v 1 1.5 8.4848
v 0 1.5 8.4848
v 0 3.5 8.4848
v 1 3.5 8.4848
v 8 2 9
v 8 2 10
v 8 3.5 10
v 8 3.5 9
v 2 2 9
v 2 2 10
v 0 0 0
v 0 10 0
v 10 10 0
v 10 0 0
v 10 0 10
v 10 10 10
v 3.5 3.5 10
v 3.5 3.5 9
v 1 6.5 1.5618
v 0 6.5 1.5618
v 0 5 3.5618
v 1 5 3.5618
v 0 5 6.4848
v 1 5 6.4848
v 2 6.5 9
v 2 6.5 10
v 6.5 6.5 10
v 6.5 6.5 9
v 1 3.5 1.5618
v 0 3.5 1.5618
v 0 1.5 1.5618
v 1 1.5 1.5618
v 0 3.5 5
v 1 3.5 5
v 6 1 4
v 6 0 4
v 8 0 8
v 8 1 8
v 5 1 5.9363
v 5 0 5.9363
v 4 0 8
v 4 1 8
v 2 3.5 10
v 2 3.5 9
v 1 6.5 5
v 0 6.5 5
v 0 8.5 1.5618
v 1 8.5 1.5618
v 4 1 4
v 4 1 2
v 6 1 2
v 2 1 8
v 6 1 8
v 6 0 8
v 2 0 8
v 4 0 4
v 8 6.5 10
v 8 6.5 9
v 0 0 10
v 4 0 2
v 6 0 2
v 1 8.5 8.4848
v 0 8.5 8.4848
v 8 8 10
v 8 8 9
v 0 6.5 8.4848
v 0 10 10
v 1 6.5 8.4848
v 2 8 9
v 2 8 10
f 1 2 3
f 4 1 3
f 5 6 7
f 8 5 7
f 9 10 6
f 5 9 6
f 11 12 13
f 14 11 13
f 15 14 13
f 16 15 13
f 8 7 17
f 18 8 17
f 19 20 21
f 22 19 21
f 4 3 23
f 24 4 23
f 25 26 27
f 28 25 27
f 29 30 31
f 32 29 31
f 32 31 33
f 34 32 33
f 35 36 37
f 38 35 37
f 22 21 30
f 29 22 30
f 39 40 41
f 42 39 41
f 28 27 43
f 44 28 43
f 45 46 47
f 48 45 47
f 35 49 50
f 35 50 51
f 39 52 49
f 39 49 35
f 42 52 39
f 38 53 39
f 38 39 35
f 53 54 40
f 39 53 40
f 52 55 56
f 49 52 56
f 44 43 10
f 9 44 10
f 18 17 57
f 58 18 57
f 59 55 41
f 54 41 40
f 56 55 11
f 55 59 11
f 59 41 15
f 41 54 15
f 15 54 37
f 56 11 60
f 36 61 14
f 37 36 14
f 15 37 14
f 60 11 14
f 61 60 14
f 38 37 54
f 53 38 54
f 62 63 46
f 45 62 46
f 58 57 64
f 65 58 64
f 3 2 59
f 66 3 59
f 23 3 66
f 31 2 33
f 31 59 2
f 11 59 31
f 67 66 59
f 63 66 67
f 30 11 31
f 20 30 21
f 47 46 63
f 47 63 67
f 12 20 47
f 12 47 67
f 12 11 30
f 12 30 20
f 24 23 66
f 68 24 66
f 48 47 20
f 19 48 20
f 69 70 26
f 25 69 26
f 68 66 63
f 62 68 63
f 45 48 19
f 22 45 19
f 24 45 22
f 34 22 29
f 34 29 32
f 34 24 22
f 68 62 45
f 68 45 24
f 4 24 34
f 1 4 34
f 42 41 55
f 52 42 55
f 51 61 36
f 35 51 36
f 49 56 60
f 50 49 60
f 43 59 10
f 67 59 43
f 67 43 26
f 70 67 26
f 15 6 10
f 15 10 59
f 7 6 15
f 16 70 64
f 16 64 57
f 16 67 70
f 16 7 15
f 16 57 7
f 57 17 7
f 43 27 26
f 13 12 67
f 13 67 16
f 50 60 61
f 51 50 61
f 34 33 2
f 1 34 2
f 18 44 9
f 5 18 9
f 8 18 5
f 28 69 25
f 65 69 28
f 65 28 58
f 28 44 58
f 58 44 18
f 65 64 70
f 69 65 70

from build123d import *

# Parameters (mm, degrees)
F0_W     = 10
F0_H     = 10
F1_DEPTH = 10
F3_DEPTH = 1
F5_DEPTH = 1
F7_DEPTH = 1


with BuildPart() as f1:
    # F0 (on Top) → F1 (new body)
    with BuildSketch(Plane.XY):
        with Locations((5, 5)):
            Rectangle(F0_W, F0_H)
    extrude(amount=F1_DEPTH)

    # F2 (on face) → F3 (cut)
    with BuildSketch(Plane.XZ):
        Polygon((4, 8), (2, 8), (4, 4), (4, 2), (6, 2), (6, 4), (8, 8), (6, 8), (5, 5.936254), align=None)
    extrude(amount=-F3_DEPTH, mode=Mode.SUBTRACT)

    # F4 (on face) → F5 (cut)
    with BuildSketch(Plane(origin=(0, 0, 0), x_dir=(0, -1, 0), z_dir=(-1, 0, 0))):
        Polygon((-6.5, 8.484827), (-8.5, 8.484827), (-6.5, 5), (-8.5, 1.56175), (-6.5, 1.56175), (-5, 3.56175), (-3.5, 1.56175), (-1.5, 1.56175), (-3.5, 5), (-1.5, 8.484827), (-3.5, 8.484827), (-5, 6.484827), align=None)
    extrude(amount=-F5_DEPTH, mode=Mode.SUBTRACT)

    # F6 (on face) → F7 (cut)
    with BuildSketch(Plane.XY.offset(10)):
        Polygon((8, 8), (2, 8), (2, 6.5), (6.5, 6.5), (2, 3.5), (2, 2), (8, 2), (8, 3.5), (3.5, 3.5), (8, 6.5), align=None)
    extrude(amount=-F7_DEPTH, mode=Mode.SUBTRACT)


solid = f1.part
